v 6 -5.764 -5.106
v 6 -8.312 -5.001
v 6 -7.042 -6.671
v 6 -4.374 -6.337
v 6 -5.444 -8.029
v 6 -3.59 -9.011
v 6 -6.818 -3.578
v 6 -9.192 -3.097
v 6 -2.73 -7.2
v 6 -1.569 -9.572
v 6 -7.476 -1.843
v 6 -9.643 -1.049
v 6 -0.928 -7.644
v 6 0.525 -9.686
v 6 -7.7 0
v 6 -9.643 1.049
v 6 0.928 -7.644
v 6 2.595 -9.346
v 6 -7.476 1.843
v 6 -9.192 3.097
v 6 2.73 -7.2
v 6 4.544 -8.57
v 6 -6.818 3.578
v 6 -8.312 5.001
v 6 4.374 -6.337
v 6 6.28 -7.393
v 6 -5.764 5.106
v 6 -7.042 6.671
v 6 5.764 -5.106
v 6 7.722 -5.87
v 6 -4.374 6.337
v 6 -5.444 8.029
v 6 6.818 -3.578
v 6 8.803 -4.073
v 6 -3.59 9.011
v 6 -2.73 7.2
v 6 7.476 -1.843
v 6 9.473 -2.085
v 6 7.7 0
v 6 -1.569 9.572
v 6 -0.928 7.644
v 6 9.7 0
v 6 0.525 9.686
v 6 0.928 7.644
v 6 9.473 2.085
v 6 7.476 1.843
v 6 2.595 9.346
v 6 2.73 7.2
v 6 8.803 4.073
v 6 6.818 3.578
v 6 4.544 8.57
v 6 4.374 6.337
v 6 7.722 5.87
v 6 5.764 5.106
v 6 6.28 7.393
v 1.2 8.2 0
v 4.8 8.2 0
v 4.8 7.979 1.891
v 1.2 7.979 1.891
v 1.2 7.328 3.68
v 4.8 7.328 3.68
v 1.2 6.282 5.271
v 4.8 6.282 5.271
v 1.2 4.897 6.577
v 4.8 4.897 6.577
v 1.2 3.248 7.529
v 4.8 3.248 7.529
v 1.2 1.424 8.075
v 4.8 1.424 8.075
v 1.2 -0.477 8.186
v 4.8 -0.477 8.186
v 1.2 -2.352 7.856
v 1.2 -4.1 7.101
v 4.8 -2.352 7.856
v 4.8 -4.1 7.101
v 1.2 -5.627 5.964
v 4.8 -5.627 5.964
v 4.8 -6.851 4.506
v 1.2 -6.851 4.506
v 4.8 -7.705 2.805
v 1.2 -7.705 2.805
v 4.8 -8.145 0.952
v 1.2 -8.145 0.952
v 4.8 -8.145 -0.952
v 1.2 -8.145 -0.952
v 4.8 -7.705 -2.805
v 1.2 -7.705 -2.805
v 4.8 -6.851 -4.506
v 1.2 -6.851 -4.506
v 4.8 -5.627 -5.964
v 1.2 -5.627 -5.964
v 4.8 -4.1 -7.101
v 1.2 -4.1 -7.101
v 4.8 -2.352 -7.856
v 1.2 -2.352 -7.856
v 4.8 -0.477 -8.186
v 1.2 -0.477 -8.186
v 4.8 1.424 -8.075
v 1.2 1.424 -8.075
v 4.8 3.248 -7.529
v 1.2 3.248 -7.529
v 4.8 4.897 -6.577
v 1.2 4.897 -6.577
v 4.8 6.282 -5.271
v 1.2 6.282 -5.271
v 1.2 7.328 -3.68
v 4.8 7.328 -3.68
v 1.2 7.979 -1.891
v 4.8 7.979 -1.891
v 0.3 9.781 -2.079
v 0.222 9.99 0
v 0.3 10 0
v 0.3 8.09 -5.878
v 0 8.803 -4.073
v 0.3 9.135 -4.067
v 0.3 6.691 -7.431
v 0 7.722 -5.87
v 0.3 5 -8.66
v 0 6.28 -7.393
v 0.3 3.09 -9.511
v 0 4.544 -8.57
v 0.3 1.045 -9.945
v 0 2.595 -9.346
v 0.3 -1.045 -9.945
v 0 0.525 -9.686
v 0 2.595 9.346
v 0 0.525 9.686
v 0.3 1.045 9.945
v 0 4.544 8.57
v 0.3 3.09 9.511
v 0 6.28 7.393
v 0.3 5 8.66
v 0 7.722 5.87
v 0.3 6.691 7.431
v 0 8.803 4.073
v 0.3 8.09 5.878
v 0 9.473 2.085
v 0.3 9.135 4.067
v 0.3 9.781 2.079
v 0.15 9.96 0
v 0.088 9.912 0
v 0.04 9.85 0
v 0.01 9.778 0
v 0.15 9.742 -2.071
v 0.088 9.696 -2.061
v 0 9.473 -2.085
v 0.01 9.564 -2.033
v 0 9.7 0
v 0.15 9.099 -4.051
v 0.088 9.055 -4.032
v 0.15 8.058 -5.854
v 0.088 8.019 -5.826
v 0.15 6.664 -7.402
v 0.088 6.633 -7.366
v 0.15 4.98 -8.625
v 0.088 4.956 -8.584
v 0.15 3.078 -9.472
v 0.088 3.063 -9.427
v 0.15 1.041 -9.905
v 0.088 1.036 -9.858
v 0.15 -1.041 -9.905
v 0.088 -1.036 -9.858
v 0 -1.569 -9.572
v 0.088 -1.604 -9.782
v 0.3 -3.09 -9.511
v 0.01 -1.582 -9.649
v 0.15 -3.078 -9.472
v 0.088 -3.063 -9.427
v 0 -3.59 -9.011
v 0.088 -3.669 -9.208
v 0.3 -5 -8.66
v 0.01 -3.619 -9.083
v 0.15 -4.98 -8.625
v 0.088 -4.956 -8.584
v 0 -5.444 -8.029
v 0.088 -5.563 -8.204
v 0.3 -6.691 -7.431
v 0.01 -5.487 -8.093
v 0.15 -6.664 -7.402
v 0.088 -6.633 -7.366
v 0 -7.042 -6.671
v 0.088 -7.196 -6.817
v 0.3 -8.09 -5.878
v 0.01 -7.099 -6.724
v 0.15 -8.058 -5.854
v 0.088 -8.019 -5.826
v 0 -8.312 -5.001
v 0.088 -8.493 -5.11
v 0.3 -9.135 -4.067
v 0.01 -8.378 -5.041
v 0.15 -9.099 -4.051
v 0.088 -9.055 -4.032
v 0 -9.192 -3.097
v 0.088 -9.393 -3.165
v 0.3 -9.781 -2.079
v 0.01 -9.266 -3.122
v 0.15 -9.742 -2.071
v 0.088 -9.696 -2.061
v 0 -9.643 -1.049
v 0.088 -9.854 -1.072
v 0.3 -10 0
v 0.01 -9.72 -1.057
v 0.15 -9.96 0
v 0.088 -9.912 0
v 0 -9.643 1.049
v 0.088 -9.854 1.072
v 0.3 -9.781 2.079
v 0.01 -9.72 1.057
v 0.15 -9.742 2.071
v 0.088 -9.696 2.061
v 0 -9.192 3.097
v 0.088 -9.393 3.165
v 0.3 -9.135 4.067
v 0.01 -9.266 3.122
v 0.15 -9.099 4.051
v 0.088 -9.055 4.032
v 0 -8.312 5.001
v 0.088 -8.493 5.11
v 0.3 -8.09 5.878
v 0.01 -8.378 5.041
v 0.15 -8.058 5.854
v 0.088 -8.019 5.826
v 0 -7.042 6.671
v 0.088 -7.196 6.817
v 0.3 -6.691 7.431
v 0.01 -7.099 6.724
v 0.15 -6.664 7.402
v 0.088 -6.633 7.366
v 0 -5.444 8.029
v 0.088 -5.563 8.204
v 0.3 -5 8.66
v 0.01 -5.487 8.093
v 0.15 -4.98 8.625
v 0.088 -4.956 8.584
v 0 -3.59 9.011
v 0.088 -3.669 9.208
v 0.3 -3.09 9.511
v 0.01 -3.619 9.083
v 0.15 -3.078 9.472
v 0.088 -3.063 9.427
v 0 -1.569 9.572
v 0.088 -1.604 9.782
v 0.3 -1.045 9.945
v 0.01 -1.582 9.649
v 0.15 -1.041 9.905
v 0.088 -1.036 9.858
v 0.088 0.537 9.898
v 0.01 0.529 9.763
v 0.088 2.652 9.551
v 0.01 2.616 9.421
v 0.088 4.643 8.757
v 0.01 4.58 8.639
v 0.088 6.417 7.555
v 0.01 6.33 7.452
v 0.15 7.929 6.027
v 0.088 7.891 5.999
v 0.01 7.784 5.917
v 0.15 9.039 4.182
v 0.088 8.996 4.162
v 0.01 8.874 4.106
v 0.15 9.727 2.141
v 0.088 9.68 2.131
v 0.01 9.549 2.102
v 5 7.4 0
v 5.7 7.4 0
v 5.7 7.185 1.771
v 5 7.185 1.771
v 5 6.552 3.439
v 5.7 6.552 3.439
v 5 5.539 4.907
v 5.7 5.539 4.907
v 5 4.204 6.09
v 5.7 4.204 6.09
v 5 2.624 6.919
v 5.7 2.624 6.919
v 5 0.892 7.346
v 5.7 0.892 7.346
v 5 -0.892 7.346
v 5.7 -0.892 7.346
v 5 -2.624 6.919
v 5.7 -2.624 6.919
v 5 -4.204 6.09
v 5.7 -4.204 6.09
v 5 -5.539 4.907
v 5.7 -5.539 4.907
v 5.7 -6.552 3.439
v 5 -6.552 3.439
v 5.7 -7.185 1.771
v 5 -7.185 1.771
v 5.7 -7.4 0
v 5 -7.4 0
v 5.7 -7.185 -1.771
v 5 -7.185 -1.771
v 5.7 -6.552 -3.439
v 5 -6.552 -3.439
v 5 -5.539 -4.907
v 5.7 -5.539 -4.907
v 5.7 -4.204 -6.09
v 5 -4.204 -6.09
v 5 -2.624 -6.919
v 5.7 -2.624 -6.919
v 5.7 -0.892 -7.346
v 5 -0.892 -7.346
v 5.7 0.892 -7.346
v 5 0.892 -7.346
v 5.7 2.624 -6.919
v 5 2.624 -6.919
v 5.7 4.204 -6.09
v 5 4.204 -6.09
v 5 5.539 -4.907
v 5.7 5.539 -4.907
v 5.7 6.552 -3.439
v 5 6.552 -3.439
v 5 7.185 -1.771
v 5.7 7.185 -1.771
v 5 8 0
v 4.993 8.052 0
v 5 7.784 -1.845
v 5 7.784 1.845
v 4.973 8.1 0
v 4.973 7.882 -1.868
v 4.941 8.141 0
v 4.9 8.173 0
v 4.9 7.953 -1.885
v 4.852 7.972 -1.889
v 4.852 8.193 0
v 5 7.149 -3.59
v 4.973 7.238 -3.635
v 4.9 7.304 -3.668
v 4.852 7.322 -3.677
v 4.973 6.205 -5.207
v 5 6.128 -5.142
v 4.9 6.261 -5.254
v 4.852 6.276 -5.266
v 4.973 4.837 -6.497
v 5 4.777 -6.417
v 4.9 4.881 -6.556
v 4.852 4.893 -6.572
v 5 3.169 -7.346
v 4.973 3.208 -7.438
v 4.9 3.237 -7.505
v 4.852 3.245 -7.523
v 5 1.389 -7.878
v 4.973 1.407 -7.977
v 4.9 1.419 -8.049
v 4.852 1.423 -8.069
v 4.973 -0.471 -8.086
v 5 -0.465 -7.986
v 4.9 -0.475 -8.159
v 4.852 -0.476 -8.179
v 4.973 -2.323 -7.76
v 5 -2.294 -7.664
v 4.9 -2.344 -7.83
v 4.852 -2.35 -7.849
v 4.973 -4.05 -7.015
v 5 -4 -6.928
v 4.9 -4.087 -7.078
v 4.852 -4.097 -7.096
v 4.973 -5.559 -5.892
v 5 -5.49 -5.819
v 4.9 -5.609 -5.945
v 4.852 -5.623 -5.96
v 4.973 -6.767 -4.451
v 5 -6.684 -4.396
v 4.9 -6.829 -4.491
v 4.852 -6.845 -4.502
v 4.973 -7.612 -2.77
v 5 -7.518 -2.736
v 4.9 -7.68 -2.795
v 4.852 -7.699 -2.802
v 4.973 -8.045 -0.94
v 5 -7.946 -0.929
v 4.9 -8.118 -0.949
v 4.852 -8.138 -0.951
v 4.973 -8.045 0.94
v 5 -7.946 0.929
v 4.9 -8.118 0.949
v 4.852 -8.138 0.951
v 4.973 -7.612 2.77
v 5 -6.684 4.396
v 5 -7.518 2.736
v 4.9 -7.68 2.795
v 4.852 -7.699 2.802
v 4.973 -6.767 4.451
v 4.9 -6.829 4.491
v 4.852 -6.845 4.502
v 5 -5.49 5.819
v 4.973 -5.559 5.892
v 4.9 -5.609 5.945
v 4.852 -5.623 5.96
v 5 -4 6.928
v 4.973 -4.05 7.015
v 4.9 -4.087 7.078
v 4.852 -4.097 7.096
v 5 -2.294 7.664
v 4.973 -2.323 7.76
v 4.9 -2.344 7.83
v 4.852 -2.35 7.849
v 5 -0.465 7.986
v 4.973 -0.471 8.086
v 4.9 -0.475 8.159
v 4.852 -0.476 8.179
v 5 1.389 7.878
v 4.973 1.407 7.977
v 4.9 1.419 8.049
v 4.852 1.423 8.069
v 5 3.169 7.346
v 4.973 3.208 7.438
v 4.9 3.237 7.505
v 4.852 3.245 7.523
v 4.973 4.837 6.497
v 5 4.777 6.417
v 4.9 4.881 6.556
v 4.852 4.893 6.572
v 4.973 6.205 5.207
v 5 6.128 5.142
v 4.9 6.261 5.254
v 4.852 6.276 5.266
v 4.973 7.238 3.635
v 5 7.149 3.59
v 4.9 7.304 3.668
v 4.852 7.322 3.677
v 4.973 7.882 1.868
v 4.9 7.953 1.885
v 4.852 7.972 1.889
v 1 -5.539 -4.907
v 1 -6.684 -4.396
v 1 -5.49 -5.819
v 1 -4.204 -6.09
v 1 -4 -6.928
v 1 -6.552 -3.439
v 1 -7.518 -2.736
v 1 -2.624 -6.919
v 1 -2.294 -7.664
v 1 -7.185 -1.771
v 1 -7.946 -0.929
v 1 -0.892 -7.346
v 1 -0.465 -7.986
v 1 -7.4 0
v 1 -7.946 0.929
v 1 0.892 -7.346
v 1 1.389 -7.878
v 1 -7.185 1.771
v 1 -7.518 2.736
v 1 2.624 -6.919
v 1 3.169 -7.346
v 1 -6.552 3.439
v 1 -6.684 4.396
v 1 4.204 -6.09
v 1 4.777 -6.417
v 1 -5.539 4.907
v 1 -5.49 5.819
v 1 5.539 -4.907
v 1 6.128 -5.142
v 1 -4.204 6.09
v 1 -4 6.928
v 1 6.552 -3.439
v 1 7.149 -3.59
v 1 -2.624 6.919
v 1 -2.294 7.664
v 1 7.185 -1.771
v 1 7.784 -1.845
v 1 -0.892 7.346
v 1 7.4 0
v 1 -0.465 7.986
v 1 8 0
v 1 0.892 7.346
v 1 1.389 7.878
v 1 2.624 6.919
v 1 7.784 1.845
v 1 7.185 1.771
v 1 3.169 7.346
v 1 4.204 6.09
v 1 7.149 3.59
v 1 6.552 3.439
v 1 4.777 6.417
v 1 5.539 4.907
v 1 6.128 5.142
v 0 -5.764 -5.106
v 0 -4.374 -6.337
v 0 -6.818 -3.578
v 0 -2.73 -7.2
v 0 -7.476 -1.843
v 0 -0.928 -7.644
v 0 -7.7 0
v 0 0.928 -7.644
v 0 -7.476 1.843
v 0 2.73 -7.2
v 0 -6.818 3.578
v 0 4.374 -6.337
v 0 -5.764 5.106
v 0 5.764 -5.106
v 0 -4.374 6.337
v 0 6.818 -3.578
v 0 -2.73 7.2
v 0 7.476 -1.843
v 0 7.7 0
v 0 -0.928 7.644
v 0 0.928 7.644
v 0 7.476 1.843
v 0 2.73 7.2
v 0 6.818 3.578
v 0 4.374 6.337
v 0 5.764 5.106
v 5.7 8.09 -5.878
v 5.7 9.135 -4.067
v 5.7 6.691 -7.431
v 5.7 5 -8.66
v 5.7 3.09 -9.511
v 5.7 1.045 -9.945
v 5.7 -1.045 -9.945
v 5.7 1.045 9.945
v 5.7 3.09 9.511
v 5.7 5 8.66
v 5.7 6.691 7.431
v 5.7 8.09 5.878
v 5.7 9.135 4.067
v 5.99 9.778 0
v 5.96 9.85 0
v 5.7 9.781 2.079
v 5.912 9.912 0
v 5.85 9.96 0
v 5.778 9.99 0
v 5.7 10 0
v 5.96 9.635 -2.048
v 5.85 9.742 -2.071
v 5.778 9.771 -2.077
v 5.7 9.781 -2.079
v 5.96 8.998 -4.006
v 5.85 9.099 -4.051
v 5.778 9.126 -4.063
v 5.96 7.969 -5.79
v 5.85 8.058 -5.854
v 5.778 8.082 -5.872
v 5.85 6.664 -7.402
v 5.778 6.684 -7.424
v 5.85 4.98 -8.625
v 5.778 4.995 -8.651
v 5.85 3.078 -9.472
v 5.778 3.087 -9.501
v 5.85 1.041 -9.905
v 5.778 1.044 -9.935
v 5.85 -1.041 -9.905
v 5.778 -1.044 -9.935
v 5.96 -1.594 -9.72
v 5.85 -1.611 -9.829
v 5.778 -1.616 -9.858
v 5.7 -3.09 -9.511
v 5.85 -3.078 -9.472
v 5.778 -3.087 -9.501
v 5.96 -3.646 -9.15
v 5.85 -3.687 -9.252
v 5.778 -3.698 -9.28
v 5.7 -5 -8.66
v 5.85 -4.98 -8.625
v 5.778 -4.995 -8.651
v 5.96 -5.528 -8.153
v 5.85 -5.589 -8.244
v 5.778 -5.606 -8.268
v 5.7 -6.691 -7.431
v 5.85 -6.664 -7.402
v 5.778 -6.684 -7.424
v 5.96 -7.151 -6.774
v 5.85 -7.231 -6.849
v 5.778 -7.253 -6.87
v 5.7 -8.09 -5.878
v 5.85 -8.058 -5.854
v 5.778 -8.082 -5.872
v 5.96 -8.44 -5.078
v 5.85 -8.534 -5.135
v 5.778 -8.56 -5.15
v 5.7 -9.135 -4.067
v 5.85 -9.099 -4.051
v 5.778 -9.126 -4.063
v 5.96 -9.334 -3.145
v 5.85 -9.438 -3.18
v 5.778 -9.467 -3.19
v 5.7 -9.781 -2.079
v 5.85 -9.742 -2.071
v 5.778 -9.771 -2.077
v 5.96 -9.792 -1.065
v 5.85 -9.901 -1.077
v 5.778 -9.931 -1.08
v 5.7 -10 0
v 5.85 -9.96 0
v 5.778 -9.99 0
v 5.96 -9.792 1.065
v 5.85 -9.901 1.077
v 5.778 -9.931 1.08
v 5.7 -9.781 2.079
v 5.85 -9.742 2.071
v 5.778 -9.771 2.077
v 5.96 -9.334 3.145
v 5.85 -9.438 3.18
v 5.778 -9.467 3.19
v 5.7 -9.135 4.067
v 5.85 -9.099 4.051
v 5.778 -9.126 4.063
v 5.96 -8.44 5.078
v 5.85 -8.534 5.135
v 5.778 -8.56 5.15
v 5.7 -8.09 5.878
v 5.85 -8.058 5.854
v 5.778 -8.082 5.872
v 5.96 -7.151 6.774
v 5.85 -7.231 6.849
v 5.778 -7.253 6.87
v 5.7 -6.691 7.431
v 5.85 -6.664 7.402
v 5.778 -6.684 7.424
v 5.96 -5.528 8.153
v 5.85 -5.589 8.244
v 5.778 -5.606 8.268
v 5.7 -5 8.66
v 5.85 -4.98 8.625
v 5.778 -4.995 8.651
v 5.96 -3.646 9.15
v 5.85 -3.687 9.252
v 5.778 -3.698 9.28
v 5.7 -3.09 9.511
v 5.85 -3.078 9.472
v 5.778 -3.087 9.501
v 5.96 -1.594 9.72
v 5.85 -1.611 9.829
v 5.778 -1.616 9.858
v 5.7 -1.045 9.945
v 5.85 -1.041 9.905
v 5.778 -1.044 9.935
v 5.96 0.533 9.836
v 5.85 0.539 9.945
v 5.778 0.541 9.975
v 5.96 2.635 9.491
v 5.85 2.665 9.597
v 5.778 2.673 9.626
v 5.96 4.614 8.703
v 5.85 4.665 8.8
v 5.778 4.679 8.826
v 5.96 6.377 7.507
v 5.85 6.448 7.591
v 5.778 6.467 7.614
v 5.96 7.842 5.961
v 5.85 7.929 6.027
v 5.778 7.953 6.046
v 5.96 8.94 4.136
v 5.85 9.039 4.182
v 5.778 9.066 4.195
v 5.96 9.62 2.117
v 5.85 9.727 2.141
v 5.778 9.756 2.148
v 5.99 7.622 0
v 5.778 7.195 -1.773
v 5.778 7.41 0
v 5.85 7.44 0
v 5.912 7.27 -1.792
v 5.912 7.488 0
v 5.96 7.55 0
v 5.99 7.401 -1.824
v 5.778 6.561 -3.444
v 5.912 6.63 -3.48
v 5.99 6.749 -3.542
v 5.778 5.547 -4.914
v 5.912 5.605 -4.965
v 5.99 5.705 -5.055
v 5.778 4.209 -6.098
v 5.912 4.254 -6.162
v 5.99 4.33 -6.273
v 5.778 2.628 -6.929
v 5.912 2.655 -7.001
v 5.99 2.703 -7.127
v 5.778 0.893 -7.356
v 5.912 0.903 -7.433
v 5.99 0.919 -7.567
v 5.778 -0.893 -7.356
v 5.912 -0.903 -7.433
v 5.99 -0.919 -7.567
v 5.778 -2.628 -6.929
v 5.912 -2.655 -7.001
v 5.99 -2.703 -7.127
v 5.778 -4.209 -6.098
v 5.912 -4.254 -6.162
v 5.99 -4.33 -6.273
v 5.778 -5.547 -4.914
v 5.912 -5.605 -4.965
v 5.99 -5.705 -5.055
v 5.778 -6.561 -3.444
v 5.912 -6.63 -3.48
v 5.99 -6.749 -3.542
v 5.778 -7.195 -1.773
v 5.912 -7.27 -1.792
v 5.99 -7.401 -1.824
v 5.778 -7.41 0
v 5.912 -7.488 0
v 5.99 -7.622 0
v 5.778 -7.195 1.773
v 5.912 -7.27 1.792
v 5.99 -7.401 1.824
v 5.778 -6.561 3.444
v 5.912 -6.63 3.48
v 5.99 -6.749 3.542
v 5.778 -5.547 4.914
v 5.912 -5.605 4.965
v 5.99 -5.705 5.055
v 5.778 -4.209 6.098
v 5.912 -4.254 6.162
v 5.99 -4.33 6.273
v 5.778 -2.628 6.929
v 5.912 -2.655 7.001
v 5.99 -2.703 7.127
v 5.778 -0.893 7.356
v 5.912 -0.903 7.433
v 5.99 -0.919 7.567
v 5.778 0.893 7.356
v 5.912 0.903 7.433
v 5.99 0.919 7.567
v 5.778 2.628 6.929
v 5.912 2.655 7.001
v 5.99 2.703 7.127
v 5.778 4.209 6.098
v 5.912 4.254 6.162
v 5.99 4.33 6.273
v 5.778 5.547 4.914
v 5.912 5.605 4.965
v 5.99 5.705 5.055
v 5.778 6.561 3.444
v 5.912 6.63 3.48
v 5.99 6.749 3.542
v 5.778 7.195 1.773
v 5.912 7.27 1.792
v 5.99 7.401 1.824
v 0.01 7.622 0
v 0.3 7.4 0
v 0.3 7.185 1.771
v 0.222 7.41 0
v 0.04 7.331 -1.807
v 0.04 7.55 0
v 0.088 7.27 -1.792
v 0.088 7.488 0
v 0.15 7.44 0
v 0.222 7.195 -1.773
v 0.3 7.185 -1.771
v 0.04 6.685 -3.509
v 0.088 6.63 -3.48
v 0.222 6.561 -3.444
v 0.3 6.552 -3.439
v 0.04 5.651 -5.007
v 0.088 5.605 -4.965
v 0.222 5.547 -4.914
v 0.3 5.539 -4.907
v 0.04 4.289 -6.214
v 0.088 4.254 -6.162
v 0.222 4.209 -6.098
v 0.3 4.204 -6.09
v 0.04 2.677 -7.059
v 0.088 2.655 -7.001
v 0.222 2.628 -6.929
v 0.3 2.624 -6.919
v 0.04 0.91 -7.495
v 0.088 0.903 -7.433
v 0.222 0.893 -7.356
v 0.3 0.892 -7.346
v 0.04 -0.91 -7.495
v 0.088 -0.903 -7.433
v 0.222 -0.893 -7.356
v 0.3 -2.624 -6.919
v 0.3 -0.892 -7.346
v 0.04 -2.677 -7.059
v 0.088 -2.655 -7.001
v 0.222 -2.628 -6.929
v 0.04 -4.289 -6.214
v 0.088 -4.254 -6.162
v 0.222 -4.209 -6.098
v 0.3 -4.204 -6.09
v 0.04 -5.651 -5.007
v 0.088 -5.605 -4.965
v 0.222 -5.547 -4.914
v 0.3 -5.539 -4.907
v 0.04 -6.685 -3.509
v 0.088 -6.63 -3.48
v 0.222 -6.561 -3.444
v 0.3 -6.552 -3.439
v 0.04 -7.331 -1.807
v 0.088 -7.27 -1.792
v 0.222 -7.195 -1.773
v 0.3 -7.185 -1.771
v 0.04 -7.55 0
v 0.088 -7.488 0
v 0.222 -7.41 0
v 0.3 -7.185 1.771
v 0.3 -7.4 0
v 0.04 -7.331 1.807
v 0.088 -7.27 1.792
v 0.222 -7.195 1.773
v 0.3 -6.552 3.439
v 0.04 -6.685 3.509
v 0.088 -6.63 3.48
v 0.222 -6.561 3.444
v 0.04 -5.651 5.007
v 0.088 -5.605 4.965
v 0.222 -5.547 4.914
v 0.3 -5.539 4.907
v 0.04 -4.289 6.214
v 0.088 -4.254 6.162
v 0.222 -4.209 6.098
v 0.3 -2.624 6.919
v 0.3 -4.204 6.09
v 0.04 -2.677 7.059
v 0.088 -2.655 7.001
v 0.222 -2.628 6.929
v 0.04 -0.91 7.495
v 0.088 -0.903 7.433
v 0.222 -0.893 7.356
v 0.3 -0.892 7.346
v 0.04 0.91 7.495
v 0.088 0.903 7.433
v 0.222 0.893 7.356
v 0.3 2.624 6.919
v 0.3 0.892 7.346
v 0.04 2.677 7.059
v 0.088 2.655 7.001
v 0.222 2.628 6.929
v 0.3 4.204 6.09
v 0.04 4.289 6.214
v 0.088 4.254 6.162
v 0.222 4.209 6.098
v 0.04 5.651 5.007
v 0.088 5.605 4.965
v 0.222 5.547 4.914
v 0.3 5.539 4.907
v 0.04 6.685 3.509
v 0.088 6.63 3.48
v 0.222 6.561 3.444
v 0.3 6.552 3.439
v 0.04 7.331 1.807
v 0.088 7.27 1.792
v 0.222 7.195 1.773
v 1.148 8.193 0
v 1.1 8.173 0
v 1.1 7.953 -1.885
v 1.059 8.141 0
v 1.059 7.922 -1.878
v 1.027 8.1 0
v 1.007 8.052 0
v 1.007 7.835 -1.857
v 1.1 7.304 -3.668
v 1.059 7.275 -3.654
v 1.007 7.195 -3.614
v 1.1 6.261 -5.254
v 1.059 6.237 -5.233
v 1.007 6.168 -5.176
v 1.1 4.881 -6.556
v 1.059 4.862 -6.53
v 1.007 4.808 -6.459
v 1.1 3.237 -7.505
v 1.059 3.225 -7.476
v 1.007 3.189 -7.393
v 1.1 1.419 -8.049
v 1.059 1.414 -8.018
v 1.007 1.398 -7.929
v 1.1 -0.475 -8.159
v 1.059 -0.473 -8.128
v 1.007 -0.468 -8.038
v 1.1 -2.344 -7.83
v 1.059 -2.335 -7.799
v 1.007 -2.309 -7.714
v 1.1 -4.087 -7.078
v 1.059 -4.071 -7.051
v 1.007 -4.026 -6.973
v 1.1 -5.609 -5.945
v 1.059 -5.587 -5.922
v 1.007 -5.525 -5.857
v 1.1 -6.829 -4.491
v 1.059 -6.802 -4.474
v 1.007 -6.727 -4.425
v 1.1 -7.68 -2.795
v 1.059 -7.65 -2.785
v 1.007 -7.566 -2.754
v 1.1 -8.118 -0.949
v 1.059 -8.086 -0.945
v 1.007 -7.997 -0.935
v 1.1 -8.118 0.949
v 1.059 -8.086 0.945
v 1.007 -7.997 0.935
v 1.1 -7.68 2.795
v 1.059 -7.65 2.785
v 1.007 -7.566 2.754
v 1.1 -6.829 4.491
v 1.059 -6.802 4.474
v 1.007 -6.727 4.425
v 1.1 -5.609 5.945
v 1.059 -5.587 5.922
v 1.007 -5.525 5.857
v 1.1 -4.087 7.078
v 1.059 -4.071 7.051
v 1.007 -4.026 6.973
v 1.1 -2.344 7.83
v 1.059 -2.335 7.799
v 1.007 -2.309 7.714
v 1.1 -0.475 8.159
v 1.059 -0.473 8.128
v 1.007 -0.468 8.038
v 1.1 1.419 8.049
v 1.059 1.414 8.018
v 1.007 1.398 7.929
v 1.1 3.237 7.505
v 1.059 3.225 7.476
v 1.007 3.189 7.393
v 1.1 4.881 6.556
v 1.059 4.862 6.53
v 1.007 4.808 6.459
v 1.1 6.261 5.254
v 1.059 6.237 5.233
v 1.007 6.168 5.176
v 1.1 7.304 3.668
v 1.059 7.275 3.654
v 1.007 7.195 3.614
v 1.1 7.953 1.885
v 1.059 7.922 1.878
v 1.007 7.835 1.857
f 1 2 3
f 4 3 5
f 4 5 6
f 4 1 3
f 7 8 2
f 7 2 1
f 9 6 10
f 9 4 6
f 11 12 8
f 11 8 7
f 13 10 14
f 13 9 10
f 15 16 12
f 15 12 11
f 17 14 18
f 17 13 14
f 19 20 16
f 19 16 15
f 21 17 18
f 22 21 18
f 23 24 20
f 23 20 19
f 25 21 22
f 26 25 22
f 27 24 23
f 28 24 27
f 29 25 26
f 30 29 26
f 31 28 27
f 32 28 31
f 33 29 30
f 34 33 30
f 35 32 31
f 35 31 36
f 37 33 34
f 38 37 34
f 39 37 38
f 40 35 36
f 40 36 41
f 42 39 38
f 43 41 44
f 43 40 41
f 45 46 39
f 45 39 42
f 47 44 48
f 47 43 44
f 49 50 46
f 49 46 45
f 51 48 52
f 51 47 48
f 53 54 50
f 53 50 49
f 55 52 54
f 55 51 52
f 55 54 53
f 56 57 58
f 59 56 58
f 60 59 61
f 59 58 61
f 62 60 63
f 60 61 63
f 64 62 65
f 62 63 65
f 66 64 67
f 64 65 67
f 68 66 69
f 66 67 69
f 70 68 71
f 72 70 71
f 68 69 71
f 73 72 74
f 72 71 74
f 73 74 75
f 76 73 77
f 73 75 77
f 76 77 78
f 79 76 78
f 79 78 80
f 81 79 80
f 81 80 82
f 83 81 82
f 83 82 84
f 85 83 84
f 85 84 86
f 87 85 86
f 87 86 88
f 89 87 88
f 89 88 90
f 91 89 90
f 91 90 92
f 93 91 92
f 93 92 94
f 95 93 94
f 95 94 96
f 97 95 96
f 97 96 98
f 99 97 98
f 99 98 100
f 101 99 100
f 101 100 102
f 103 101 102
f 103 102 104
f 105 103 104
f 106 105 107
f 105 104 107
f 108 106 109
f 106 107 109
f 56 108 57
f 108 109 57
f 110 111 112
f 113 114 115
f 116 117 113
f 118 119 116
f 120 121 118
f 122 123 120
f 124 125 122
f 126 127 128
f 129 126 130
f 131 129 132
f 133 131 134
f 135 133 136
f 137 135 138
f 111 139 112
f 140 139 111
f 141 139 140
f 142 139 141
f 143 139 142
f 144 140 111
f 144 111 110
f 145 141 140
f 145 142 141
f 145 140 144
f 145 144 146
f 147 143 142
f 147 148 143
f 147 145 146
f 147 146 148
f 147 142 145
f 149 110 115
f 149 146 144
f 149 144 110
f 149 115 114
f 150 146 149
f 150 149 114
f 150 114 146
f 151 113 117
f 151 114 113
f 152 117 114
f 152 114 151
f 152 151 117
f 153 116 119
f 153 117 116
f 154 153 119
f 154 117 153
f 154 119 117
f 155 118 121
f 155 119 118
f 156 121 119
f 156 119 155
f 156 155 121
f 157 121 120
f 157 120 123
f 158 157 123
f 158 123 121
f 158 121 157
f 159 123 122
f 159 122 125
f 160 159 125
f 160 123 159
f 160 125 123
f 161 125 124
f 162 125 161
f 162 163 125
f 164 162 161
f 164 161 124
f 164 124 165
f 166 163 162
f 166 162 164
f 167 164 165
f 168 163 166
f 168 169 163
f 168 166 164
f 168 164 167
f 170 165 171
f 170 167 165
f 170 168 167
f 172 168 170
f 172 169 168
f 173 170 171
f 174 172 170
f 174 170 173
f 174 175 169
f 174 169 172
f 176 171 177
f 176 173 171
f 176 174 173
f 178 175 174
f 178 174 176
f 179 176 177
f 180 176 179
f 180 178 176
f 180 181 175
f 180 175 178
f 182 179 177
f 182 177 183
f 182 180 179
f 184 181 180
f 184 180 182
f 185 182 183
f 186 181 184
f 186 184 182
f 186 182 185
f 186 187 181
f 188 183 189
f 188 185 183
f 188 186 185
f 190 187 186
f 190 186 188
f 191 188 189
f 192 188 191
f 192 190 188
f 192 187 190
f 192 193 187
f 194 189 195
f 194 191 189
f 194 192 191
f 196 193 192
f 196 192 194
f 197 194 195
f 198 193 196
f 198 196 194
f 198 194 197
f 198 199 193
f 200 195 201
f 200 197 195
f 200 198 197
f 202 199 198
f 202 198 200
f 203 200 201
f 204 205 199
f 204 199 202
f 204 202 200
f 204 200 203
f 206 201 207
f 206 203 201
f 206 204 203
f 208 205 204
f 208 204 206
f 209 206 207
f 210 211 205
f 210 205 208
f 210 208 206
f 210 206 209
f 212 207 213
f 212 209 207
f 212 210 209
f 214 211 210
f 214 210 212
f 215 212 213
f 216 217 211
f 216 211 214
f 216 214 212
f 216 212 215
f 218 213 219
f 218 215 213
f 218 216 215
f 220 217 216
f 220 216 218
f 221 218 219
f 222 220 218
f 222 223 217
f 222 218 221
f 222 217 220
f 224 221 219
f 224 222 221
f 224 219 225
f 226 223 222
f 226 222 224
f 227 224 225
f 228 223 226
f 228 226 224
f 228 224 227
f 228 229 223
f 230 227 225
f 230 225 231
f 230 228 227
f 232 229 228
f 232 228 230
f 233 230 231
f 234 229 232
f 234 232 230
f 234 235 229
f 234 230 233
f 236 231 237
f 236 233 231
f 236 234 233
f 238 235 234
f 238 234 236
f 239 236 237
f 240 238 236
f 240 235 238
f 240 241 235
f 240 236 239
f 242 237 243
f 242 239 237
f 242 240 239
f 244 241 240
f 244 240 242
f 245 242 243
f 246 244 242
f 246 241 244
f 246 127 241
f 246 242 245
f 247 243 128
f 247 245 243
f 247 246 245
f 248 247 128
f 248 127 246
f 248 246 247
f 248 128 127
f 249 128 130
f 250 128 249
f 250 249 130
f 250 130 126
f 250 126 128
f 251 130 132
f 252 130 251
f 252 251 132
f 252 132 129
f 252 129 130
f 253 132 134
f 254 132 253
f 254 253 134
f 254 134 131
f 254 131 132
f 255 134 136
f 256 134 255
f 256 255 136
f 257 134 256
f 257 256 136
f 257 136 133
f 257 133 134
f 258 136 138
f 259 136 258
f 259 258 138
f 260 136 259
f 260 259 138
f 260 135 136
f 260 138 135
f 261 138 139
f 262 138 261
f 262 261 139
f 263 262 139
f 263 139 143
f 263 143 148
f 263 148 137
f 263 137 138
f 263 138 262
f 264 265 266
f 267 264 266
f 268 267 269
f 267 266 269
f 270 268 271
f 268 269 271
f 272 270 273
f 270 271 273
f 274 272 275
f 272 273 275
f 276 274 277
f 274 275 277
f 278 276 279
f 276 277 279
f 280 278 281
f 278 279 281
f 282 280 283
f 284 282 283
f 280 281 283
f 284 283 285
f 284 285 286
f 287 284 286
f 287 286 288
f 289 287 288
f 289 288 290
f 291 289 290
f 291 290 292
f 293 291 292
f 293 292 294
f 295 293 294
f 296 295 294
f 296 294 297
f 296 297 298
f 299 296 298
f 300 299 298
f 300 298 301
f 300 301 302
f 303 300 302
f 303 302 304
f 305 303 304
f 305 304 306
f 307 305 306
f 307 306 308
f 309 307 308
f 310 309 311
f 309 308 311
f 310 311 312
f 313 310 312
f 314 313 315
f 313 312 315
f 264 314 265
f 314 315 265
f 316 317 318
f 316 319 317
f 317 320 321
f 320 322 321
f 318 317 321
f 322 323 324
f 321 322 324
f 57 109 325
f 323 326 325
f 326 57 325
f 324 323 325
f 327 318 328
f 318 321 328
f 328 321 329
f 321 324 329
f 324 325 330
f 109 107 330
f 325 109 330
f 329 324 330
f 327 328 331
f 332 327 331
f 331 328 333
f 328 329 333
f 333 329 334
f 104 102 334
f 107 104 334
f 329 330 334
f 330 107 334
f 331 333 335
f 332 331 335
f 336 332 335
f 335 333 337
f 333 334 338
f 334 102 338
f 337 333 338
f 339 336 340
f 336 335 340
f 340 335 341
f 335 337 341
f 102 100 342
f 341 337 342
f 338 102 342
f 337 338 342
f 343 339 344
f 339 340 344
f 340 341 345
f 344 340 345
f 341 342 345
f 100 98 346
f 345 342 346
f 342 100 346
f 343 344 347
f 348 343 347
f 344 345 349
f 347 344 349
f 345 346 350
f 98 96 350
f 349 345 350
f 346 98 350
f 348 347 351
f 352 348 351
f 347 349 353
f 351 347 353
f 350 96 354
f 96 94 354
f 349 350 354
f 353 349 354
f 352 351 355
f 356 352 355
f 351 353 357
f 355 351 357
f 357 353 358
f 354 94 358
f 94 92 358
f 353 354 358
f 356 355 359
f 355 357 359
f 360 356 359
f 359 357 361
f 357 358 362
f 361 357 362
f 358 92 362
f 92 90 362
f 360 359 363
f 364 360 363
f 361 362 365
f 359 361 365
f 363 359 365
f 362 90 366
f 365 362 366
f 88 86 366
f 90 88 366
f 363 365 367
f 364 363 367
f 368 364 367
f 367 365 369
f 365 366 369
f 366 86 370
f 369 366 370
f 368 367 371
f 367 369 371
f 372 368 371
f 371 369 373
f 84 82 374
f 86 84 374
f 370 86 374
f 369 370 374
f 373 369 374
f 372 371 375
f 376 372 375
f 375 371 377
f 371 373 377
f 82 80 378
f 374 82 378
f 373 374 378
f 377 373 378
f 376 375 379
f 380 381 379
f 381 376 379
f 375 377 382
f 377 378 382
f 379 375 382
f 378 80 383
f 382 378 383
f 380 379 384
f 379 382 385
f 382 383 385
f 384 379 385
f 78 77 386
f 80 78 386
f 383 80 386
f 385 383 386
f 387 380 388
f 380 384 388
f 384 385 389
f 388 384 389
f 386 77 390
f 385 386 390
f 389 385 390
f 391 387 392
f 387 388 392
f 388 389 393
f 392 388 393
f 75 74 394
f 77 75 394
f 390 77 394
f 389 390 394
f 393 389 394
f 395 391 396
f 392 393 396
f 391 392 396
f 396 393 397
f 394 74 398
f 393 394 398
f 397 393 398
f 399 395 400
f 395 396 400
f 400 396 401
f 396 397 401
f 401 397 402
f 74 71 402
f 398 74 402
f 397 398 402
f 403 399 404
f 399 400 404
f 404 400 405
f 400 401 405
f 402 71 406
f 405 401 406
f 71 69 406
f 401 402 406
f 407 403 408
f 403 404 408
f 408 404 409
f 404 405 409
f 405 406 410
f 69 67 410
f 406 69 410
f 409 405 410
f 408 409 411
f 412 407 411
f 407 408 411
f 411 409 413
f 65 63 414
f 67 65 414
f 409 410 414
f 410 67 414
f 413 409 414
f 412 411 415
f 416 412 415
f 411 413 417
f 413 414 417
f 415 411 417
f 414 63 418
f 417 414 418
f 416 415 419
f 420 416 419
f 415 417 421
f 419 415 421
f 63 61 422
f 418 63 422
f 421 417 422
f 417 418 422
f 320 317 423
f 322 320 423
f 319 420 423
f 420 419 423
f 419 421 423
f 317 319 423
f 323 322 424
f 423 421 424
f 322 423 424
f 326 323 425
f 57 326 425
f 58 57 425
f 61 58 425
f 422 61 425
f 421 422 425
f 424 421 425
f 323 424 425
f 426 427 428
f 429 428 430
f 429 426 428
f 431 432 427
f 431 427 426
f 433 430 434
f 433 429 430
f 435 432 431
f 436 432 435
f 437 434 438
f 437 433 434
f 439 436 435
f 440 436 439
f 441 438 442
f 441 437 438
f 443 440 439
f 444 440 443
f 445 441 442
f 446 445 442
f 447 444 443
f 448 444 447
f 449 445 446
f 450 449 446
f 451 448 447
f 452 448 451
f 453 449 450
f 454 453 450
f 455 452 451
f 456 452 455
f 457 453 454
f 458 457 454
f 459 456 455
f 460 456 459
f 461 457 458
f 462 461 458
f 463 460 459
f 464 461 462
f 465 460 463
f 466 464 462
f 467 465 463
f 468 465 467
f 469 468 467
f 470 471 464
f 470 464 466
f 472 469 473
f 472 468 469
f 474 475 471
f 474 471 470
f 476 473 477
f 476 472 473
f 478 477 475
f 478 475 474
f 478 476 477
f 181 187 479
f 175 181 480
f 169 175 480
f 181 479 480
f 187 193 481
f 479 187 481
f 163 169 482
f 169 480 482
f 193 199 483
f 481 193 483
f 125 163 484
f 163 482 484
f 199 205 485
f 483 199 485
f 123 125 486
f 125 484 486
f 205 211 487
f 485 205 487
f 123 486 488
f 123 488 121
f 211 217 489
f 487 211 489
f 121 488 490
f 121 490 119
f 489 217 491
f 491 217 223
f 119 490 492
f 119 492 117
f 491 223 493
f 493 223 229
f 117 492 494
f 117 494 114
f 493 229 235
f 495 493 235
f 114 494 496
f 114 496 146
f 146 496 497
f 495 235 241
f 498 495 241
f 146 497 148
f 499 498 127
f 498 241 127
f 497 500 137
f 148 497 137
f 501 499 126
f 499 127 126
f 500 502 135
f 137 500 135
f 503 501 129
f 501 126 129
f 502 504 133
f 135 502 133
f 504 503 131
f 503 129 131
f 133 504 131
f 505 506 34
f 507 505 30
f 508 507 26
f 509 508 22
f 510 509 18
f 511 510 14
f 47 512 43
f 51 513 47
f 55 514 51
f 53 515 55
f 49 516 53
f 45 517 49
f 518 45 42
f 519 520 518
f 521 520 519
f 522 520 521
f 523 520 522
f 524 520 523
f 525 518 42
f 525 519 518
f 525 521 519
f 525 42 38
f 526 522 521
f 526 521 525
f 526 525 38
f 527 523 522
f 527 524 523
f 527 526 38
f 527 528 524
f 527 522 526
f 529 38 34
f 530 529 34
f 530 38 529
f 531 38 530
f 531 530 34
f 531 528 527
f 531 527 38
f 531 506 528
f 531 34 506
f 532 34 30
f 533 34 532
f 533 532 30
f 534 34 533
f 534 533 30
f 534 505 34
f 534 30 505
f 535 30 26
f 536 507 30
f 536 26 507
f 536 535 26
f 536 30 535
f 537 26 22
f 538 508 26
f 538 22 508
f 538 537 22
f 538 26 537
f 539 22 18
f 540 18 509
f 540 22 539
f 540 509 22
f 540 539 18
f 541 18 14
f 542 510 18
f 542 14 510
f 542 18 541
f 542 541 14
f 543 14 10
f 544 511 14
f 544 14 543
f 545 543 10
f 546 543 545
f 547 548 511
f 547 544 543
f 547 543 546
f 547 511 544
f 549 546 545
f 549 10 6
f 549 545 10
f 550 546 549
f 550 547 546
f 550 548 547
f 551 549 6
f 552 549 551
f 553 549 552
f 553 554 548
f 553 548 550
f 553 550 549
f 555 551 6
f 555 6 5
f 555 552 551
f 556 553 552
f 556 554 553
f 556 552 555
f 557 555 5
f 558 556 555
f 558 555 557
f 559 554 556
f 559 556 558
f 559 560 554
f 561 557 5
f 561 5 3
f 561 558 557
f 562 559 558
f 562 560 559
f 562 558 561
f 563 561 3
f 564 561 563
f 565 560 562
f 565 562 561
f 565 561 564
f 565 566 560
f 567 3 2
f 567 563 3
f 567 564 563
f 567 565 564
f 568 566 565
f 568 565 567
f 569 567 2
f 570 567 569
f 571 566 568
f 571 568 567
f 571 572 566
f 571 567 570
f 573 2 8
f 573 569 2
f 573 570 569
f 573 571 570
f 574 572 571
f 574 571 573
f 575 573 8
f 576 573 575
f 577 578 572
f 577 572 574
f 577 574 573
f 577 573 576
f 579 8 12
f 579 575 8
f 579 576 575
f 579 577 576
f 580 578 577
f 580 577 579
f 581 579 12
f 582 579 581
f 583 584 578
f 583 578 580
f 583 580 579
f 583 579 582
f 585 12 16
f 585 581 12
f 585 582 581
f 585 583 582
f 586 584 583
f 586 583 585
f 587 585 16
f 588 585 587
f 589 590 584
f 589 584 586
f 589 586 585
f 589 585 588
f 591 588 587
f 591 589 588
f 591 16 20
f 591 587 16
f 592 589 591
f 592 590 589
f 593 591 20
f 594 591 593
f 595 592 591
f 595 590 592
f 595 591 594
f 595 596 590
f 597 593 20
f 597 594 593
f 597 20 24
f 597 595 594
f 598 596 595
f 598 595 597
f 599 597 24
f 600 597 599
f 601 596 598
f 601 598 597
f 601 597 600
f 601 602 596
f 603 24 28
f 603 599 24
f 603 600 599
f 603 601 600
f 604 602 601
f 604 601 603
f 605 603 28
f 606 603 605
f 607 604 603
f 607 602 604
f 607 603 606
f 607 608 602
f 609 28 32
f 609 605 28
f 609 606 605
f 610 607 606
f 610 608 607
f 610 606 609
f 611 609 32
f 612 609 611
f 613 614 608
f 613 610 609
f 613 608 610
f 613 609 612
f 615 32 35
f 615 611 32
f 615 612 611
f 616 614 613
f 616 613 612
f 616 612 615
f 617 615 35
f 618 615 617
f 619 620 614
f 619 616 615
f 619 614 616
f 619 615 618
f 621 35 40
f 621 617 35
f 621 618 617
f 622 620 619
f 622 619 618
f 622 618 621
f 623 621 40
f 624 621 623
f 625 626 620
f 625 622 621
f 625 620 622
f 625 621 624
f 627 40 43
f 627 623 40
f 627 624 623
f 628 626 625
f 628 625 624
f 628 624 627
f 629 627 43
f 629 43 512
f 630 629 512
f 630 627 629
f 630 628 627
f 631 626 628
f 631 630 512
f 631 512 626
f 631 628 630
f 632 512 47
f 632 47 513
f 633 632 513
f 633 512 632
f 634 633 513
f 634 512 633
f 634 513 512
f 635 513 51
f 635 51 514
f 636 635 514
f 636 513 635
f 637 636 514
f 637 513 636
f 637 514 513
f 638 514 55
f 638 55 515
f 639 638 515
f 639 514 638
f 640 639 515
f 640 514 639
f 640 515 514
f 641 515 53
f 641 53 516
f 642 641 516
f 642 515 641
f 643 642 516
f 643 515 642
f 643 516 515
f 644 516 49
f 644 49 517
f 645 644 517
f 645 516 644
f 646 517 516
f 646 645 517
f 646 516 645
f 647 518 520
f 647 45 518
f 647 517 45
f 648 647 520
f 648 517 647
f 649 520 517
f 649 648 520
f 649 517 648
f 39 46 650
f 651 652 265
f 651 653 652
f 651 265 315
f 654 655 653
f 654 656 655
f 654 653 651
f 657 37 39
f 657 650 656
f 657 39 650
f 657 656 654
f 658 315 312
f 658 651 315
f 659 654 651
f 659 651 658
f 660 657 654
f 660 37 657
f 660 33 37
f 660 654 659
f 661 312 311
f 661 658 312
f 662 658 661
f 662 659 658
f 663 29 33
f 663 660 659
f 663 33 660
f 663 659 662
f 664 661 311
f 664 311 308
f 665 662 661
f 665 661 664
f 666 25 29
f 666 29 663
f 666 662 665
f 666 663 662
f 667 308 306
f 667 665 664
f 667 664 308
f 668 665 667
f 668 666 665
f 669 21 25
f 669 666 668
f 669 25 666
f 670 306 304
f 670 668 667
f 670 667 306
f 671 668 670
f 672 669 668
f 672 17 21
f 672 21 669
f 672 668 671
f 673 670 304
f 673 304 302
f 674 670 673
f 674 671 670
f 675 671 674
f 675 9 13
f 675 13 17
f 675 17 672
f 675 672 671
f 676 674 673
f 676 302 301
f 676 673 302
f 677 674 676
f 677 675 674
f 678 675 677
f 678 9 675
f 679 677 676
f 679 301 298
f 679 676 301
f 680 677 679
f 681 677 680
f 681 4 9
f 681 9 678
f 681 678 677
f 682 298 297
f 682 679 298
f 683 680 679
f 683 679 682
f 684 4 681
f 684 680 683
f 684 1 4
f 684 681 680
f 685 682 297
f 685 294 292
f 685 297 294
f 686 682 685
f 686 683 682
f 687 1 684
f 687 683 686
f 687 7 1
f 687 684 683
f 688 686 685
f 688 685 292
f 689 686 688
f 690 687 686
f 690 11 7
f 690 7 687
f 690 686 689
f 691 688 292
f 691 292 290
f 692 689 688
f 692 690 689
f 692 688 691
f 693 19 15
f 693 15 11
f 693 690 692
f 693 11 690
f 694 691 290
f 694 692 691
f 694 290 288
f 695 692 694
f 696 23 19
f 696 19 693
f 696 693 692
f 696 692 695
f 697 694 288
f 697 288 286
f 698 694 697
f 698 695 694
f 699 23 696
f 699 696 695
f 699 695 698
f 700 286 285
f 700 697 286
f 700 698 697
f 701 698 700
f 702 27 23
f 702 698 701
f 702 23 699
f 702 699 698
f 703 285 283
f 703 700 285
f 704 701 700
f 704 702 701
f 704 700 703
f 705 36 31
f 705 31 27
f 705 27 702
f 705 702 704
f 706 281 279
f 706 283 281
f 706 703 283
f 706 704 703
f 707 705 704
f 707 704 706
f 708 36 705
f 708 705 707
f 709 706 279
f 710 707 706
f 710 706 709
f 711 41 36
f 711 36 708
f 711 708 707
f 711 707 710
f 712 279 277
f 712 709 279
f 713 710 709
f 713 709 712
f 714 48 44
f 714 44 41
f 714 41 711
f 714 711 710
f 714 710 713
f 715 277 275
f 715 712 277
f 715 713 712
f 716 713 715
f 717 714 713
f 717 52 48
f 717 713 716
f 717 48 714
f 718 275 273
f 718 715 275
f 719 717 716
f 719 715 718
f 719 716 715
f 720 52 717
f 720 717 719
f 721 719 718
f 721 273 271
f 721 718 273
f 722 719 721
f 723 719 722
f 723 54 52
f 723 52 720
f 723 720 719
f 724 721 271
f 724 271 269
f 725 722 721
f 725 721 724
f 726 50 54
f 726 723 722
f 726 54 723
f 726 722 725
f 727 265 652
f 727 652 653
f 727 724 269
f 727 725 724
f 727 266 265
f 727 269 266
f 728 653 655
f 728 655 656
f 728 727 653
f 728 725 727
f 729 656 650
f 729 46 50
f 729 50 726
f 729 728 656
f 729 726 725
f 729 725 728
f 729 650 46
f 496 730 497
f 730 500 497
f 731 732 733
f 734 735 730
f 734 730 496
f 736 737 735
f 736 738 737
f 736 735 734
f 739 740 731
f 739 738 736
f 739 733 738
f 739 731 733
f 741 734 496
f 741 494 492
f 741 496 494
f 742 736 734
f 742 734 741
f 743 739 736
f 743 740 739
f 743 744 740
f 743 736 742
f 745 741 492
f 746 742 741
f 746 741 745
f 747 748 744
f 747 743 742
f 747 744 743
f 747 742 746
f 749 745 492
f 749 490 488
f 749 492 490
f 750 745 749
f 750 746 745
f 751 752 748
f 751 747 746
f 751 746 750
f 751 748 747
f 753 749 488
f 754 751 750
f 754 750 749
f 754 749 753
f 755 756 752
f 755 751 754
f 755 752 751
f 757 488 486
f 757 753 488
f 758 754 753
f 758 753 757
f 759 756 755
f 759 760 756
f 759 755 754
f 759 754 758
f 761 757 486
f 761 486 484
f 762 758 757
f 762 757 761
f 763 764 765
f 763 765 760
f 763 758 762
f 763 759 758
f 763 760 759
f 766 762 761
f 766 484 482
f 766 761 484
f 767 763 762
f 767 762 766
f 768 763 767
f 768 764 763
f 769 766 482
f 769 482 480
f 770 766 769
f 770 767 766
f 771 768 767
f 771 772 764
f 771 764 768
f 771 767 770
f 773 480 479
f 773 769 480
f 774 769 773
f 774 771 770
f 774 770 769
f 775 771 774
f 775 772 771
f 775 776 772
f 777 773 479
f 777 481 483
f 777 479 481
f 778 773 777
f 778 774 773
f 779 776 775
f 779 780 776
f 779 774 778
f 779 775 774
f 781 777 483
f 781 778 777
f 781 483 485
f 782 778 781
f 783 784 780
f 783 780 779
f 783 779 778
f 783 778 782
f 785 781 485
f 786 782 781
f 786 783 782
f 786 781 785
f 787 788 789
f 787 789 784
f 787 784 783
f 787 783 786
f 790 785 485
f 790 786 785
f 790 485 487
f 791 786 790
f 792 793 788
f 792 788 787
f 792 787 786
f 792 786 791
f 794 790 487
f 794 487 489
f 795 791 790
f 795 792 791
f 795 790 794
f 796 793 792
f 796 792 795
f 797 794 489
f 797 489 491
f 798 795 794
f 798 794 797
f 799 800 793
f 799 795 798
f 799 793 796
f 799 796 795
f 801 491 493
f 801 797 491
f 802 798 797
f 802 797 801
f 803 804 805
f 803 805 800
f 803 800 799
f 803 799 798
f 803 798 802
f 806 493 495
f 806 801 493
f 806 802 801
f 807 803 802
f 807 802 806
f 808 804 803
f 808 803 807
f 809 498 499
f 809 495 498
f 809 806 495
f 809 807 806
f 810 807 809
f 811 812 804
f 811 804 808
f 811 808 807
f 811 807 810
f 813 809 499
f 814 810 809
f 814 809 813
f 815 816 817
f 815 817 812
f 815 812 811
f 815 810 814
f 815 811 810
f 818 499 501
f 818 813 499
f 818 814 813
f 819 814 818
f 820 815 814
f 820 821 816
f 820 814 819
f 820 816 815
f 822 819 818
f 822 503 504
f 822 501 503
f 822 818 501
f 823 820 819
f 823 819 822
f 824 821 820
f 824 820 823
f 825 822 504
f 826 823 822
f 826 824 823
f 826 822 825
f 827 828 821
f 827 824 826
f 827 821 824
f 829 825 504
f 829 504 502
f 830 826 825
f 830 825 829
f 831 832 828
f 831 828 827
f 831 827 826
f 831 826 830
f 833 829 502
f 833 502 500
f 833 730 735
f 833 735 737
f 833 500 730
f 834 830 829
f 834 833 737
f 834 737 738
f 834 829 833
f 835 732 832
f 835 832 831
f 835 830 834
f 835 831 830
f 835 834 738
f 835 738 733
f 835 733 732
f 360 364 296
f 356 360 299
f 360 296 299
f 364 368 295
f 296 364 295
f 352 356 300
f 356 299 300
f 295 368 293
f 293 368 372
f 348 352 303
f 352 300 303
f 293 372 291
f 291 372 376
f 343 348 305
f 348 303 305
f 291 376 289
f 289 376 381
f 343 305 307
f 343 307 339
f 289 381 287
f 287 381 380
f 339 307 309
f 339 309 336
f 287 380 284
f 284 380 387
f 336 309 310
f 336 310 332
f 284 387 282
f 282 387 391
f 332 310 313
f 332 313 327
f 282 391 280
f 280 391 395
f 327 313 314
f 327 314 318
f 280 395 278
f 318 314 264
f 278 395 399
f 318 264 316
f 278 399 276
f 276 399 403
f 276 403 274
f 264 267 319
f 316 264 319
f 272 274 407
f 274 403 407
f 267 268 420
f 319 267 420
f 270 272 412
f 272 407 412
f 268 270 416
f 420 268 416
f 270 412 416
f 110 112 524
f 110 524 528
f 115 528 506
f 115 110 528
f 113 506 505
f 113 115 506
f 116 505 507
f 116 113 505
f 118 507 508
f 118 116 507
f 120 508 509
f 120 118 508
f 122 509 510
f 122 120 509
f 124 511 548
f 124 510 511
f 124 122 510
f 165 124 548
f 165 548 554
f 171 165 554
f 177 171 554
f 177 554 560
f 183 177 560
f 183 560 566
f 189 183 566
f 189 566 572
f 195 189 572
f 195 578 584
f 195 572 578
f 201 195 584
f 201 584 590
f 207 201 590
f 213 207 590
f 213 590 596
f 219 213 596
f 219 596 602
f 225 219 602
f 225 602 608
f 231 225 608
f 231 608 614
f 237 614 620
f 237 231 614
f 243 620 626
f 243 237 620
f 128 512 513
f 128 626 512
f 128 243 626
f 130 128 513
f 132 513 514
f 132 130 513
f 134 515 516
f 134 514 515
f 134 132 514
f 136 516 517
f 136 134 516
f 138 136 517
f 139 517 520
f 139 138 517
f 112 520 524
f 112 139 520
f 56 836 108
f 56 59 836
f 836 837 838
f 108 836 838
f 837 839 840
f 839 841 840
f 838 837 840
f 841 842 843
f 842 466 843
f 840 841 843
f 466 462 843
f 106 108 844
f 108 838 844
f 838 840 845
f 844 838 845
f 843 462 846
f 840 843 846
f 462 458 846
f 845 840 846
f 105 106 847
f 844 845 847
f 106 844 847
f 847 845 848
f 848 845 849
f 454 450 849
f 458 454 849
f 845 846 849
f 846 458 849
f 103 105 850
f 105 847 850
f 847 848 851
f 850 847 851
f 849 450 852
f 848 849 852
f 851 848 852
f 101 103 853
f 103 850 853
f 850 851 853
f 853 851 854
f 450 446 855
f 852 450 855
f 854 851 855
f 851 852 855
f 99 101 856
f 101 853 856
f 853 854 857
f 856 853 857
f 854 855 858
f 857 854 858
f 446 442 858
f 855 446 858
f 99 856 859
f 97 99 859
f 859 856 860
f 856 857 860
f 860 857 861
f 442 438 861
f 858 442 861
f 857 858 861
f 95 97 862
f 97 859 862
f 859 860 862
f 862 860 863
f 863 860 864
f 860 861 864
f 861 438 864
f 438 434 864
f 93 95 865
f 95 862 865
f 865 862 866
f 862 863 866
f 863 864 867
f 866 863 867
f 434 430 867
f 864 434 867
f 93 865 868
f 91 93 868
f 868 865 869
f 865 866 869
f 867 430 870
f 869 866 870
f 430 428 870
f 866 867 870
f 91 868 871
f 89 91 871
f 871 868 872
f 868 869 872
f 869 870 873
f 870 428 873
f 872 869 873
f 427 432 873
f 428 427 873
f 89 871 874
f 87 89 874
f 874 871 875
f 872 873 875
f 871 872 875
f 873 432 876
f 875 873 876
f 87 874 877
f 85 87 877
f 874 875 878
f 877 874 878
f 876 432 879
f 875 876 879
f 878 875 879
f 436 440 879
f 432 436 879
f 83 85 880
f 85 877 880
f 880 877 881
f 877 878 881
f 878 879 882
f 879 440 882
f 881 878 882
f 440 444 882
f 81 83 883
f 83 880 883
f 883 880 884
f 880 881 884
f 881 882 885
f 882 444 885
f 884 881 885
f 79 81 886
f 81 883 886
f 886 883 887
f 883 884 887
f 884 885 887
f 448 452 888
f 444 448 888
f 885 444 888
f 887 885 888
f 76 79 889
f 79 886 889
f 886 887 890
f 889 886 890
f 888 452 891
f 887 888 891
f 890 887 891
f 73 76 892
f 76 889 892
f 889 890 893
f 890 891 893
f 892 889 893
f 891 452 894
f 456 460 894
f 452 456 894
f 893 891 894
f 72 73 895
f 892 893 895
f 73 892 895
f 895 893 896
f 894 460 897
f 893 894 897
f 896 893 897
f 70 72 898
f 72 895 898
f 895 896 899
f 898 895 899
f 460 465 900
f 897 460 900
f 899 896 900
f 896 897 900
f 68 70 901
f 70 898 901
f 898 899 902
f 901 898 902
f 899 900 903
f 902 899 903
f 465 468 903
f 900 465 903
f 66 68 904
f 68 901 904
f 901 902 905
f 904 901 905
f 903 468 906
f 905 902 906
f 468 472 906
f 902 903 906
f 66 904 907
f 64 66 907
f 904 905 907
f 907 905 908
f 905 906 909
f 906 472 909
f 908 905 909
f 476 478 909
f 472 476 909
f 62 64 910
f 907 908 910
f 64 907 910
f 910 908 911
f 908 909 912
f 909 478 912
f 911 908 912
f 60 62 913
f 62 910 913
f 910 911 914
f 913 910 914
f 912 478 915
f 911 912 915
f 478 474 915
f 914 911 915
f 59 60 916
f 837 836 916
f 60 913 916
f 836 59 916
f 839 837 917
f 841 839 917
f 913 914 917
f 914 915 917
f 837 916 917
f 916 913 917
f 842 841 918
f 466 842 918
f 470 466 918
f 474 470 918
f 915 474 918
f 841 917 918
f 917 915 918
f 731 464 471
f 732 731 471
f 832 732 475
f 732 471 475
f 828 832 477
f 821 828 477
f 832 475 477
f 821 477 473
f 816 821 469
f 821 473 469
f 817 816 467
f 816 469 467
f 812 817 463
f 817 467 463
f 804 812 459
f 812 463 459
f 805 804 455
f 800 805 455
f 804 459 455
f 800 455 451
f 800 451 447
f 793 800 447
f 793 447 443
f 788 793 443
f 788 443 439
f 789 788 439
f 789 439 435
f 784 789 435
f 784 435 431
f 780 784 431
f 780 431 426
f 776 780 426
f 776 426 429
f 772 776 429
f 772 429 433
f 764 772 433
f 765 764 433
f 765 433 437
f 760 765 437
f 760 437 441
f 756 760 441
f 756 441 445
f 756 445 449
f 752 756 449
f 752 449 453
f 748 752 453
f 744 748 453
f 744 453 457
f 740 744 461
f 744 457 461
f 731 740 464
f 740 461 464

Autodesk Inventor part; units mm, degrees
sketch "Sketch_1" plane through (0, 0, 0) normal (0, 0, 1) x (1, 0, 0)
  line L0 (6, 0) -> (0, 0)
  arc A0 (0, 7.7) -> (0.3, 7.4) centre (0.3, 7.7) ccw
  line L1 (0.3, 7.4) -> (1, 7.4)
  line L2 (1, 7.4) -> (1, 8)
  arc A1 (1.2, 8.2) -> (1, 8) centre (1.2, 8) ccw
  line L3 (1.2, 8.2) -> (4.8, 8.2)
  arc A2 (5, 8) -> (4.8, 8.2) centre (4.8, 8) ccw
  line L4 (5, 8) -> (5, 7.4)
  line L5 (5, 7.4) -> (5.7, 7.4)
  arc A3 (5.7, 7.4) -> (6, 7.7) centre (5.7, 7.7) ccw
  line L6 (6, 7.7) -> (6, 9.7)
  arc A4 (6, 9.7) -> (5.7, 10) centre (5.7, 9.7) ccw
  line L7 (5.7, 10) -> (0.3, 10)
  arc A5 (0.3, 10) -> (0, 9.7) centre (0.3, 9.7) ccw
  line L8 (0, 9.7) -> (0, 7.7)
revolve "Revolution1" add sketch "Sketch_1" angle 360 about axis through (6, 0, 0) along (1, 0, 0)
ref_plane "IP_roller_typ1_XY" through (3, 0, 0) normal (1, 0, 0) x (0, 0, -1)
ref_plane "IP_roller_typ1_YZ" through (3, 0, 0) normal (0, 0, -1) x (0, 1, 0)
ref_plane "IP_roller_typ1_ZX" through (3, 0, 0) normal (0, 1, 0) x (1, 0, 0)
ref_plane "OR_IR_XY" through (0, 0, 0) normal (1, 0, 0) x (0, 0, -1)
ref_plane "OR_IR_YZ" through (0, 0, 0) normal (0, 0, -1) x (0, 1, 0)
ref_plane "OR_IR_ZX" through (0, 0, 0) normal (0, 1, 0) x (1, 0, 0)
ref_plane "OR_ball_1_XY" through (3, 5.6, 0) normal (1, 0, 0) x (0, 0, -1)
ref_plane "OR_ball_1_YZ" through (3, 5.6, 0) normal (0, 0, -1) x (0, 1, 0)
ref_plane "OR_ball_1_ZX" through (3, 5.6, 0) normal (0, 1, 0) x (1, 0, 0)
ref_plane "OR_ball_2_XY" through (3, 1.7305, 5.3259) normal (1, 0, 0) x (0, 0, -1)
ref_plane "OR_ball_2_YZ" through (3, 1.7305, 5.3259) normal (0, 0, -1) x (0, 1, 0)
ref_plane "OR_ball_2_ZX" through (3, 1.7305, 5.3259) normal (0, 1, 0) x (1, 0, 0)
ref_plane "OR_ball_3_XY" through (3, -4.5305, 3.2916) normal (1, 0, 0) x (0, 0, -1)
ref_plane "OR_ball_3_YZ" through (3, -4.5305, 3.2916) normal (0, 0, -1) x (0, 1, 0)
ref_plane "OR_ball_3_ZX" through (3, -4.5305, 3.2916) normal (0, 1, 0) x (1, 0, 0)
ref_plane "OR_ball_4_XY" through (3, -4.5305, -3.2916) normal (1, 0, 0) x (0, 0, -1)
ref_plane "OR_ball_4_YZ" through (3, -4.5305, -3.2916) normal (0, 0, -1) x (0, 1, 0)
ref_plane "OR_ball_4_ZX" through (3, -4.5305, -3.2916) normal (0, 1, 0) x (1, 0, 0)
ref_plane "OR_ball_5_XY" through (3, 1.7305, -5.3259) normal (1, 0, 0) x (0, 0, -1)
ref_plane "OR_ball_5_YZ" through (3, 1.7305, -5.3259) normal (0, 0, -1) x (0, 1, 0)
ref_plane "OR_ball_5_ZX" through (3, 1.7305, -5.3259) normal (0, 1, 0) x (1, 0, 0)
ref_plane "OR_dummy_XY" through (0, 0, 0) normal (1, 0, 0) x (0, 0, -1)
ref_plane "OR_dummy_YZ" through (0, 0, 0) normal (0, 0, -1) x (0, 1, 0)
ref_plane "OR_dummy_ZX" through (0, 0, 0) normal (0, 1, 0) x (1, 0, 0)
properties part number "110202DT-20-L1260ZZ_or" material "アセタール樹脂、白"
